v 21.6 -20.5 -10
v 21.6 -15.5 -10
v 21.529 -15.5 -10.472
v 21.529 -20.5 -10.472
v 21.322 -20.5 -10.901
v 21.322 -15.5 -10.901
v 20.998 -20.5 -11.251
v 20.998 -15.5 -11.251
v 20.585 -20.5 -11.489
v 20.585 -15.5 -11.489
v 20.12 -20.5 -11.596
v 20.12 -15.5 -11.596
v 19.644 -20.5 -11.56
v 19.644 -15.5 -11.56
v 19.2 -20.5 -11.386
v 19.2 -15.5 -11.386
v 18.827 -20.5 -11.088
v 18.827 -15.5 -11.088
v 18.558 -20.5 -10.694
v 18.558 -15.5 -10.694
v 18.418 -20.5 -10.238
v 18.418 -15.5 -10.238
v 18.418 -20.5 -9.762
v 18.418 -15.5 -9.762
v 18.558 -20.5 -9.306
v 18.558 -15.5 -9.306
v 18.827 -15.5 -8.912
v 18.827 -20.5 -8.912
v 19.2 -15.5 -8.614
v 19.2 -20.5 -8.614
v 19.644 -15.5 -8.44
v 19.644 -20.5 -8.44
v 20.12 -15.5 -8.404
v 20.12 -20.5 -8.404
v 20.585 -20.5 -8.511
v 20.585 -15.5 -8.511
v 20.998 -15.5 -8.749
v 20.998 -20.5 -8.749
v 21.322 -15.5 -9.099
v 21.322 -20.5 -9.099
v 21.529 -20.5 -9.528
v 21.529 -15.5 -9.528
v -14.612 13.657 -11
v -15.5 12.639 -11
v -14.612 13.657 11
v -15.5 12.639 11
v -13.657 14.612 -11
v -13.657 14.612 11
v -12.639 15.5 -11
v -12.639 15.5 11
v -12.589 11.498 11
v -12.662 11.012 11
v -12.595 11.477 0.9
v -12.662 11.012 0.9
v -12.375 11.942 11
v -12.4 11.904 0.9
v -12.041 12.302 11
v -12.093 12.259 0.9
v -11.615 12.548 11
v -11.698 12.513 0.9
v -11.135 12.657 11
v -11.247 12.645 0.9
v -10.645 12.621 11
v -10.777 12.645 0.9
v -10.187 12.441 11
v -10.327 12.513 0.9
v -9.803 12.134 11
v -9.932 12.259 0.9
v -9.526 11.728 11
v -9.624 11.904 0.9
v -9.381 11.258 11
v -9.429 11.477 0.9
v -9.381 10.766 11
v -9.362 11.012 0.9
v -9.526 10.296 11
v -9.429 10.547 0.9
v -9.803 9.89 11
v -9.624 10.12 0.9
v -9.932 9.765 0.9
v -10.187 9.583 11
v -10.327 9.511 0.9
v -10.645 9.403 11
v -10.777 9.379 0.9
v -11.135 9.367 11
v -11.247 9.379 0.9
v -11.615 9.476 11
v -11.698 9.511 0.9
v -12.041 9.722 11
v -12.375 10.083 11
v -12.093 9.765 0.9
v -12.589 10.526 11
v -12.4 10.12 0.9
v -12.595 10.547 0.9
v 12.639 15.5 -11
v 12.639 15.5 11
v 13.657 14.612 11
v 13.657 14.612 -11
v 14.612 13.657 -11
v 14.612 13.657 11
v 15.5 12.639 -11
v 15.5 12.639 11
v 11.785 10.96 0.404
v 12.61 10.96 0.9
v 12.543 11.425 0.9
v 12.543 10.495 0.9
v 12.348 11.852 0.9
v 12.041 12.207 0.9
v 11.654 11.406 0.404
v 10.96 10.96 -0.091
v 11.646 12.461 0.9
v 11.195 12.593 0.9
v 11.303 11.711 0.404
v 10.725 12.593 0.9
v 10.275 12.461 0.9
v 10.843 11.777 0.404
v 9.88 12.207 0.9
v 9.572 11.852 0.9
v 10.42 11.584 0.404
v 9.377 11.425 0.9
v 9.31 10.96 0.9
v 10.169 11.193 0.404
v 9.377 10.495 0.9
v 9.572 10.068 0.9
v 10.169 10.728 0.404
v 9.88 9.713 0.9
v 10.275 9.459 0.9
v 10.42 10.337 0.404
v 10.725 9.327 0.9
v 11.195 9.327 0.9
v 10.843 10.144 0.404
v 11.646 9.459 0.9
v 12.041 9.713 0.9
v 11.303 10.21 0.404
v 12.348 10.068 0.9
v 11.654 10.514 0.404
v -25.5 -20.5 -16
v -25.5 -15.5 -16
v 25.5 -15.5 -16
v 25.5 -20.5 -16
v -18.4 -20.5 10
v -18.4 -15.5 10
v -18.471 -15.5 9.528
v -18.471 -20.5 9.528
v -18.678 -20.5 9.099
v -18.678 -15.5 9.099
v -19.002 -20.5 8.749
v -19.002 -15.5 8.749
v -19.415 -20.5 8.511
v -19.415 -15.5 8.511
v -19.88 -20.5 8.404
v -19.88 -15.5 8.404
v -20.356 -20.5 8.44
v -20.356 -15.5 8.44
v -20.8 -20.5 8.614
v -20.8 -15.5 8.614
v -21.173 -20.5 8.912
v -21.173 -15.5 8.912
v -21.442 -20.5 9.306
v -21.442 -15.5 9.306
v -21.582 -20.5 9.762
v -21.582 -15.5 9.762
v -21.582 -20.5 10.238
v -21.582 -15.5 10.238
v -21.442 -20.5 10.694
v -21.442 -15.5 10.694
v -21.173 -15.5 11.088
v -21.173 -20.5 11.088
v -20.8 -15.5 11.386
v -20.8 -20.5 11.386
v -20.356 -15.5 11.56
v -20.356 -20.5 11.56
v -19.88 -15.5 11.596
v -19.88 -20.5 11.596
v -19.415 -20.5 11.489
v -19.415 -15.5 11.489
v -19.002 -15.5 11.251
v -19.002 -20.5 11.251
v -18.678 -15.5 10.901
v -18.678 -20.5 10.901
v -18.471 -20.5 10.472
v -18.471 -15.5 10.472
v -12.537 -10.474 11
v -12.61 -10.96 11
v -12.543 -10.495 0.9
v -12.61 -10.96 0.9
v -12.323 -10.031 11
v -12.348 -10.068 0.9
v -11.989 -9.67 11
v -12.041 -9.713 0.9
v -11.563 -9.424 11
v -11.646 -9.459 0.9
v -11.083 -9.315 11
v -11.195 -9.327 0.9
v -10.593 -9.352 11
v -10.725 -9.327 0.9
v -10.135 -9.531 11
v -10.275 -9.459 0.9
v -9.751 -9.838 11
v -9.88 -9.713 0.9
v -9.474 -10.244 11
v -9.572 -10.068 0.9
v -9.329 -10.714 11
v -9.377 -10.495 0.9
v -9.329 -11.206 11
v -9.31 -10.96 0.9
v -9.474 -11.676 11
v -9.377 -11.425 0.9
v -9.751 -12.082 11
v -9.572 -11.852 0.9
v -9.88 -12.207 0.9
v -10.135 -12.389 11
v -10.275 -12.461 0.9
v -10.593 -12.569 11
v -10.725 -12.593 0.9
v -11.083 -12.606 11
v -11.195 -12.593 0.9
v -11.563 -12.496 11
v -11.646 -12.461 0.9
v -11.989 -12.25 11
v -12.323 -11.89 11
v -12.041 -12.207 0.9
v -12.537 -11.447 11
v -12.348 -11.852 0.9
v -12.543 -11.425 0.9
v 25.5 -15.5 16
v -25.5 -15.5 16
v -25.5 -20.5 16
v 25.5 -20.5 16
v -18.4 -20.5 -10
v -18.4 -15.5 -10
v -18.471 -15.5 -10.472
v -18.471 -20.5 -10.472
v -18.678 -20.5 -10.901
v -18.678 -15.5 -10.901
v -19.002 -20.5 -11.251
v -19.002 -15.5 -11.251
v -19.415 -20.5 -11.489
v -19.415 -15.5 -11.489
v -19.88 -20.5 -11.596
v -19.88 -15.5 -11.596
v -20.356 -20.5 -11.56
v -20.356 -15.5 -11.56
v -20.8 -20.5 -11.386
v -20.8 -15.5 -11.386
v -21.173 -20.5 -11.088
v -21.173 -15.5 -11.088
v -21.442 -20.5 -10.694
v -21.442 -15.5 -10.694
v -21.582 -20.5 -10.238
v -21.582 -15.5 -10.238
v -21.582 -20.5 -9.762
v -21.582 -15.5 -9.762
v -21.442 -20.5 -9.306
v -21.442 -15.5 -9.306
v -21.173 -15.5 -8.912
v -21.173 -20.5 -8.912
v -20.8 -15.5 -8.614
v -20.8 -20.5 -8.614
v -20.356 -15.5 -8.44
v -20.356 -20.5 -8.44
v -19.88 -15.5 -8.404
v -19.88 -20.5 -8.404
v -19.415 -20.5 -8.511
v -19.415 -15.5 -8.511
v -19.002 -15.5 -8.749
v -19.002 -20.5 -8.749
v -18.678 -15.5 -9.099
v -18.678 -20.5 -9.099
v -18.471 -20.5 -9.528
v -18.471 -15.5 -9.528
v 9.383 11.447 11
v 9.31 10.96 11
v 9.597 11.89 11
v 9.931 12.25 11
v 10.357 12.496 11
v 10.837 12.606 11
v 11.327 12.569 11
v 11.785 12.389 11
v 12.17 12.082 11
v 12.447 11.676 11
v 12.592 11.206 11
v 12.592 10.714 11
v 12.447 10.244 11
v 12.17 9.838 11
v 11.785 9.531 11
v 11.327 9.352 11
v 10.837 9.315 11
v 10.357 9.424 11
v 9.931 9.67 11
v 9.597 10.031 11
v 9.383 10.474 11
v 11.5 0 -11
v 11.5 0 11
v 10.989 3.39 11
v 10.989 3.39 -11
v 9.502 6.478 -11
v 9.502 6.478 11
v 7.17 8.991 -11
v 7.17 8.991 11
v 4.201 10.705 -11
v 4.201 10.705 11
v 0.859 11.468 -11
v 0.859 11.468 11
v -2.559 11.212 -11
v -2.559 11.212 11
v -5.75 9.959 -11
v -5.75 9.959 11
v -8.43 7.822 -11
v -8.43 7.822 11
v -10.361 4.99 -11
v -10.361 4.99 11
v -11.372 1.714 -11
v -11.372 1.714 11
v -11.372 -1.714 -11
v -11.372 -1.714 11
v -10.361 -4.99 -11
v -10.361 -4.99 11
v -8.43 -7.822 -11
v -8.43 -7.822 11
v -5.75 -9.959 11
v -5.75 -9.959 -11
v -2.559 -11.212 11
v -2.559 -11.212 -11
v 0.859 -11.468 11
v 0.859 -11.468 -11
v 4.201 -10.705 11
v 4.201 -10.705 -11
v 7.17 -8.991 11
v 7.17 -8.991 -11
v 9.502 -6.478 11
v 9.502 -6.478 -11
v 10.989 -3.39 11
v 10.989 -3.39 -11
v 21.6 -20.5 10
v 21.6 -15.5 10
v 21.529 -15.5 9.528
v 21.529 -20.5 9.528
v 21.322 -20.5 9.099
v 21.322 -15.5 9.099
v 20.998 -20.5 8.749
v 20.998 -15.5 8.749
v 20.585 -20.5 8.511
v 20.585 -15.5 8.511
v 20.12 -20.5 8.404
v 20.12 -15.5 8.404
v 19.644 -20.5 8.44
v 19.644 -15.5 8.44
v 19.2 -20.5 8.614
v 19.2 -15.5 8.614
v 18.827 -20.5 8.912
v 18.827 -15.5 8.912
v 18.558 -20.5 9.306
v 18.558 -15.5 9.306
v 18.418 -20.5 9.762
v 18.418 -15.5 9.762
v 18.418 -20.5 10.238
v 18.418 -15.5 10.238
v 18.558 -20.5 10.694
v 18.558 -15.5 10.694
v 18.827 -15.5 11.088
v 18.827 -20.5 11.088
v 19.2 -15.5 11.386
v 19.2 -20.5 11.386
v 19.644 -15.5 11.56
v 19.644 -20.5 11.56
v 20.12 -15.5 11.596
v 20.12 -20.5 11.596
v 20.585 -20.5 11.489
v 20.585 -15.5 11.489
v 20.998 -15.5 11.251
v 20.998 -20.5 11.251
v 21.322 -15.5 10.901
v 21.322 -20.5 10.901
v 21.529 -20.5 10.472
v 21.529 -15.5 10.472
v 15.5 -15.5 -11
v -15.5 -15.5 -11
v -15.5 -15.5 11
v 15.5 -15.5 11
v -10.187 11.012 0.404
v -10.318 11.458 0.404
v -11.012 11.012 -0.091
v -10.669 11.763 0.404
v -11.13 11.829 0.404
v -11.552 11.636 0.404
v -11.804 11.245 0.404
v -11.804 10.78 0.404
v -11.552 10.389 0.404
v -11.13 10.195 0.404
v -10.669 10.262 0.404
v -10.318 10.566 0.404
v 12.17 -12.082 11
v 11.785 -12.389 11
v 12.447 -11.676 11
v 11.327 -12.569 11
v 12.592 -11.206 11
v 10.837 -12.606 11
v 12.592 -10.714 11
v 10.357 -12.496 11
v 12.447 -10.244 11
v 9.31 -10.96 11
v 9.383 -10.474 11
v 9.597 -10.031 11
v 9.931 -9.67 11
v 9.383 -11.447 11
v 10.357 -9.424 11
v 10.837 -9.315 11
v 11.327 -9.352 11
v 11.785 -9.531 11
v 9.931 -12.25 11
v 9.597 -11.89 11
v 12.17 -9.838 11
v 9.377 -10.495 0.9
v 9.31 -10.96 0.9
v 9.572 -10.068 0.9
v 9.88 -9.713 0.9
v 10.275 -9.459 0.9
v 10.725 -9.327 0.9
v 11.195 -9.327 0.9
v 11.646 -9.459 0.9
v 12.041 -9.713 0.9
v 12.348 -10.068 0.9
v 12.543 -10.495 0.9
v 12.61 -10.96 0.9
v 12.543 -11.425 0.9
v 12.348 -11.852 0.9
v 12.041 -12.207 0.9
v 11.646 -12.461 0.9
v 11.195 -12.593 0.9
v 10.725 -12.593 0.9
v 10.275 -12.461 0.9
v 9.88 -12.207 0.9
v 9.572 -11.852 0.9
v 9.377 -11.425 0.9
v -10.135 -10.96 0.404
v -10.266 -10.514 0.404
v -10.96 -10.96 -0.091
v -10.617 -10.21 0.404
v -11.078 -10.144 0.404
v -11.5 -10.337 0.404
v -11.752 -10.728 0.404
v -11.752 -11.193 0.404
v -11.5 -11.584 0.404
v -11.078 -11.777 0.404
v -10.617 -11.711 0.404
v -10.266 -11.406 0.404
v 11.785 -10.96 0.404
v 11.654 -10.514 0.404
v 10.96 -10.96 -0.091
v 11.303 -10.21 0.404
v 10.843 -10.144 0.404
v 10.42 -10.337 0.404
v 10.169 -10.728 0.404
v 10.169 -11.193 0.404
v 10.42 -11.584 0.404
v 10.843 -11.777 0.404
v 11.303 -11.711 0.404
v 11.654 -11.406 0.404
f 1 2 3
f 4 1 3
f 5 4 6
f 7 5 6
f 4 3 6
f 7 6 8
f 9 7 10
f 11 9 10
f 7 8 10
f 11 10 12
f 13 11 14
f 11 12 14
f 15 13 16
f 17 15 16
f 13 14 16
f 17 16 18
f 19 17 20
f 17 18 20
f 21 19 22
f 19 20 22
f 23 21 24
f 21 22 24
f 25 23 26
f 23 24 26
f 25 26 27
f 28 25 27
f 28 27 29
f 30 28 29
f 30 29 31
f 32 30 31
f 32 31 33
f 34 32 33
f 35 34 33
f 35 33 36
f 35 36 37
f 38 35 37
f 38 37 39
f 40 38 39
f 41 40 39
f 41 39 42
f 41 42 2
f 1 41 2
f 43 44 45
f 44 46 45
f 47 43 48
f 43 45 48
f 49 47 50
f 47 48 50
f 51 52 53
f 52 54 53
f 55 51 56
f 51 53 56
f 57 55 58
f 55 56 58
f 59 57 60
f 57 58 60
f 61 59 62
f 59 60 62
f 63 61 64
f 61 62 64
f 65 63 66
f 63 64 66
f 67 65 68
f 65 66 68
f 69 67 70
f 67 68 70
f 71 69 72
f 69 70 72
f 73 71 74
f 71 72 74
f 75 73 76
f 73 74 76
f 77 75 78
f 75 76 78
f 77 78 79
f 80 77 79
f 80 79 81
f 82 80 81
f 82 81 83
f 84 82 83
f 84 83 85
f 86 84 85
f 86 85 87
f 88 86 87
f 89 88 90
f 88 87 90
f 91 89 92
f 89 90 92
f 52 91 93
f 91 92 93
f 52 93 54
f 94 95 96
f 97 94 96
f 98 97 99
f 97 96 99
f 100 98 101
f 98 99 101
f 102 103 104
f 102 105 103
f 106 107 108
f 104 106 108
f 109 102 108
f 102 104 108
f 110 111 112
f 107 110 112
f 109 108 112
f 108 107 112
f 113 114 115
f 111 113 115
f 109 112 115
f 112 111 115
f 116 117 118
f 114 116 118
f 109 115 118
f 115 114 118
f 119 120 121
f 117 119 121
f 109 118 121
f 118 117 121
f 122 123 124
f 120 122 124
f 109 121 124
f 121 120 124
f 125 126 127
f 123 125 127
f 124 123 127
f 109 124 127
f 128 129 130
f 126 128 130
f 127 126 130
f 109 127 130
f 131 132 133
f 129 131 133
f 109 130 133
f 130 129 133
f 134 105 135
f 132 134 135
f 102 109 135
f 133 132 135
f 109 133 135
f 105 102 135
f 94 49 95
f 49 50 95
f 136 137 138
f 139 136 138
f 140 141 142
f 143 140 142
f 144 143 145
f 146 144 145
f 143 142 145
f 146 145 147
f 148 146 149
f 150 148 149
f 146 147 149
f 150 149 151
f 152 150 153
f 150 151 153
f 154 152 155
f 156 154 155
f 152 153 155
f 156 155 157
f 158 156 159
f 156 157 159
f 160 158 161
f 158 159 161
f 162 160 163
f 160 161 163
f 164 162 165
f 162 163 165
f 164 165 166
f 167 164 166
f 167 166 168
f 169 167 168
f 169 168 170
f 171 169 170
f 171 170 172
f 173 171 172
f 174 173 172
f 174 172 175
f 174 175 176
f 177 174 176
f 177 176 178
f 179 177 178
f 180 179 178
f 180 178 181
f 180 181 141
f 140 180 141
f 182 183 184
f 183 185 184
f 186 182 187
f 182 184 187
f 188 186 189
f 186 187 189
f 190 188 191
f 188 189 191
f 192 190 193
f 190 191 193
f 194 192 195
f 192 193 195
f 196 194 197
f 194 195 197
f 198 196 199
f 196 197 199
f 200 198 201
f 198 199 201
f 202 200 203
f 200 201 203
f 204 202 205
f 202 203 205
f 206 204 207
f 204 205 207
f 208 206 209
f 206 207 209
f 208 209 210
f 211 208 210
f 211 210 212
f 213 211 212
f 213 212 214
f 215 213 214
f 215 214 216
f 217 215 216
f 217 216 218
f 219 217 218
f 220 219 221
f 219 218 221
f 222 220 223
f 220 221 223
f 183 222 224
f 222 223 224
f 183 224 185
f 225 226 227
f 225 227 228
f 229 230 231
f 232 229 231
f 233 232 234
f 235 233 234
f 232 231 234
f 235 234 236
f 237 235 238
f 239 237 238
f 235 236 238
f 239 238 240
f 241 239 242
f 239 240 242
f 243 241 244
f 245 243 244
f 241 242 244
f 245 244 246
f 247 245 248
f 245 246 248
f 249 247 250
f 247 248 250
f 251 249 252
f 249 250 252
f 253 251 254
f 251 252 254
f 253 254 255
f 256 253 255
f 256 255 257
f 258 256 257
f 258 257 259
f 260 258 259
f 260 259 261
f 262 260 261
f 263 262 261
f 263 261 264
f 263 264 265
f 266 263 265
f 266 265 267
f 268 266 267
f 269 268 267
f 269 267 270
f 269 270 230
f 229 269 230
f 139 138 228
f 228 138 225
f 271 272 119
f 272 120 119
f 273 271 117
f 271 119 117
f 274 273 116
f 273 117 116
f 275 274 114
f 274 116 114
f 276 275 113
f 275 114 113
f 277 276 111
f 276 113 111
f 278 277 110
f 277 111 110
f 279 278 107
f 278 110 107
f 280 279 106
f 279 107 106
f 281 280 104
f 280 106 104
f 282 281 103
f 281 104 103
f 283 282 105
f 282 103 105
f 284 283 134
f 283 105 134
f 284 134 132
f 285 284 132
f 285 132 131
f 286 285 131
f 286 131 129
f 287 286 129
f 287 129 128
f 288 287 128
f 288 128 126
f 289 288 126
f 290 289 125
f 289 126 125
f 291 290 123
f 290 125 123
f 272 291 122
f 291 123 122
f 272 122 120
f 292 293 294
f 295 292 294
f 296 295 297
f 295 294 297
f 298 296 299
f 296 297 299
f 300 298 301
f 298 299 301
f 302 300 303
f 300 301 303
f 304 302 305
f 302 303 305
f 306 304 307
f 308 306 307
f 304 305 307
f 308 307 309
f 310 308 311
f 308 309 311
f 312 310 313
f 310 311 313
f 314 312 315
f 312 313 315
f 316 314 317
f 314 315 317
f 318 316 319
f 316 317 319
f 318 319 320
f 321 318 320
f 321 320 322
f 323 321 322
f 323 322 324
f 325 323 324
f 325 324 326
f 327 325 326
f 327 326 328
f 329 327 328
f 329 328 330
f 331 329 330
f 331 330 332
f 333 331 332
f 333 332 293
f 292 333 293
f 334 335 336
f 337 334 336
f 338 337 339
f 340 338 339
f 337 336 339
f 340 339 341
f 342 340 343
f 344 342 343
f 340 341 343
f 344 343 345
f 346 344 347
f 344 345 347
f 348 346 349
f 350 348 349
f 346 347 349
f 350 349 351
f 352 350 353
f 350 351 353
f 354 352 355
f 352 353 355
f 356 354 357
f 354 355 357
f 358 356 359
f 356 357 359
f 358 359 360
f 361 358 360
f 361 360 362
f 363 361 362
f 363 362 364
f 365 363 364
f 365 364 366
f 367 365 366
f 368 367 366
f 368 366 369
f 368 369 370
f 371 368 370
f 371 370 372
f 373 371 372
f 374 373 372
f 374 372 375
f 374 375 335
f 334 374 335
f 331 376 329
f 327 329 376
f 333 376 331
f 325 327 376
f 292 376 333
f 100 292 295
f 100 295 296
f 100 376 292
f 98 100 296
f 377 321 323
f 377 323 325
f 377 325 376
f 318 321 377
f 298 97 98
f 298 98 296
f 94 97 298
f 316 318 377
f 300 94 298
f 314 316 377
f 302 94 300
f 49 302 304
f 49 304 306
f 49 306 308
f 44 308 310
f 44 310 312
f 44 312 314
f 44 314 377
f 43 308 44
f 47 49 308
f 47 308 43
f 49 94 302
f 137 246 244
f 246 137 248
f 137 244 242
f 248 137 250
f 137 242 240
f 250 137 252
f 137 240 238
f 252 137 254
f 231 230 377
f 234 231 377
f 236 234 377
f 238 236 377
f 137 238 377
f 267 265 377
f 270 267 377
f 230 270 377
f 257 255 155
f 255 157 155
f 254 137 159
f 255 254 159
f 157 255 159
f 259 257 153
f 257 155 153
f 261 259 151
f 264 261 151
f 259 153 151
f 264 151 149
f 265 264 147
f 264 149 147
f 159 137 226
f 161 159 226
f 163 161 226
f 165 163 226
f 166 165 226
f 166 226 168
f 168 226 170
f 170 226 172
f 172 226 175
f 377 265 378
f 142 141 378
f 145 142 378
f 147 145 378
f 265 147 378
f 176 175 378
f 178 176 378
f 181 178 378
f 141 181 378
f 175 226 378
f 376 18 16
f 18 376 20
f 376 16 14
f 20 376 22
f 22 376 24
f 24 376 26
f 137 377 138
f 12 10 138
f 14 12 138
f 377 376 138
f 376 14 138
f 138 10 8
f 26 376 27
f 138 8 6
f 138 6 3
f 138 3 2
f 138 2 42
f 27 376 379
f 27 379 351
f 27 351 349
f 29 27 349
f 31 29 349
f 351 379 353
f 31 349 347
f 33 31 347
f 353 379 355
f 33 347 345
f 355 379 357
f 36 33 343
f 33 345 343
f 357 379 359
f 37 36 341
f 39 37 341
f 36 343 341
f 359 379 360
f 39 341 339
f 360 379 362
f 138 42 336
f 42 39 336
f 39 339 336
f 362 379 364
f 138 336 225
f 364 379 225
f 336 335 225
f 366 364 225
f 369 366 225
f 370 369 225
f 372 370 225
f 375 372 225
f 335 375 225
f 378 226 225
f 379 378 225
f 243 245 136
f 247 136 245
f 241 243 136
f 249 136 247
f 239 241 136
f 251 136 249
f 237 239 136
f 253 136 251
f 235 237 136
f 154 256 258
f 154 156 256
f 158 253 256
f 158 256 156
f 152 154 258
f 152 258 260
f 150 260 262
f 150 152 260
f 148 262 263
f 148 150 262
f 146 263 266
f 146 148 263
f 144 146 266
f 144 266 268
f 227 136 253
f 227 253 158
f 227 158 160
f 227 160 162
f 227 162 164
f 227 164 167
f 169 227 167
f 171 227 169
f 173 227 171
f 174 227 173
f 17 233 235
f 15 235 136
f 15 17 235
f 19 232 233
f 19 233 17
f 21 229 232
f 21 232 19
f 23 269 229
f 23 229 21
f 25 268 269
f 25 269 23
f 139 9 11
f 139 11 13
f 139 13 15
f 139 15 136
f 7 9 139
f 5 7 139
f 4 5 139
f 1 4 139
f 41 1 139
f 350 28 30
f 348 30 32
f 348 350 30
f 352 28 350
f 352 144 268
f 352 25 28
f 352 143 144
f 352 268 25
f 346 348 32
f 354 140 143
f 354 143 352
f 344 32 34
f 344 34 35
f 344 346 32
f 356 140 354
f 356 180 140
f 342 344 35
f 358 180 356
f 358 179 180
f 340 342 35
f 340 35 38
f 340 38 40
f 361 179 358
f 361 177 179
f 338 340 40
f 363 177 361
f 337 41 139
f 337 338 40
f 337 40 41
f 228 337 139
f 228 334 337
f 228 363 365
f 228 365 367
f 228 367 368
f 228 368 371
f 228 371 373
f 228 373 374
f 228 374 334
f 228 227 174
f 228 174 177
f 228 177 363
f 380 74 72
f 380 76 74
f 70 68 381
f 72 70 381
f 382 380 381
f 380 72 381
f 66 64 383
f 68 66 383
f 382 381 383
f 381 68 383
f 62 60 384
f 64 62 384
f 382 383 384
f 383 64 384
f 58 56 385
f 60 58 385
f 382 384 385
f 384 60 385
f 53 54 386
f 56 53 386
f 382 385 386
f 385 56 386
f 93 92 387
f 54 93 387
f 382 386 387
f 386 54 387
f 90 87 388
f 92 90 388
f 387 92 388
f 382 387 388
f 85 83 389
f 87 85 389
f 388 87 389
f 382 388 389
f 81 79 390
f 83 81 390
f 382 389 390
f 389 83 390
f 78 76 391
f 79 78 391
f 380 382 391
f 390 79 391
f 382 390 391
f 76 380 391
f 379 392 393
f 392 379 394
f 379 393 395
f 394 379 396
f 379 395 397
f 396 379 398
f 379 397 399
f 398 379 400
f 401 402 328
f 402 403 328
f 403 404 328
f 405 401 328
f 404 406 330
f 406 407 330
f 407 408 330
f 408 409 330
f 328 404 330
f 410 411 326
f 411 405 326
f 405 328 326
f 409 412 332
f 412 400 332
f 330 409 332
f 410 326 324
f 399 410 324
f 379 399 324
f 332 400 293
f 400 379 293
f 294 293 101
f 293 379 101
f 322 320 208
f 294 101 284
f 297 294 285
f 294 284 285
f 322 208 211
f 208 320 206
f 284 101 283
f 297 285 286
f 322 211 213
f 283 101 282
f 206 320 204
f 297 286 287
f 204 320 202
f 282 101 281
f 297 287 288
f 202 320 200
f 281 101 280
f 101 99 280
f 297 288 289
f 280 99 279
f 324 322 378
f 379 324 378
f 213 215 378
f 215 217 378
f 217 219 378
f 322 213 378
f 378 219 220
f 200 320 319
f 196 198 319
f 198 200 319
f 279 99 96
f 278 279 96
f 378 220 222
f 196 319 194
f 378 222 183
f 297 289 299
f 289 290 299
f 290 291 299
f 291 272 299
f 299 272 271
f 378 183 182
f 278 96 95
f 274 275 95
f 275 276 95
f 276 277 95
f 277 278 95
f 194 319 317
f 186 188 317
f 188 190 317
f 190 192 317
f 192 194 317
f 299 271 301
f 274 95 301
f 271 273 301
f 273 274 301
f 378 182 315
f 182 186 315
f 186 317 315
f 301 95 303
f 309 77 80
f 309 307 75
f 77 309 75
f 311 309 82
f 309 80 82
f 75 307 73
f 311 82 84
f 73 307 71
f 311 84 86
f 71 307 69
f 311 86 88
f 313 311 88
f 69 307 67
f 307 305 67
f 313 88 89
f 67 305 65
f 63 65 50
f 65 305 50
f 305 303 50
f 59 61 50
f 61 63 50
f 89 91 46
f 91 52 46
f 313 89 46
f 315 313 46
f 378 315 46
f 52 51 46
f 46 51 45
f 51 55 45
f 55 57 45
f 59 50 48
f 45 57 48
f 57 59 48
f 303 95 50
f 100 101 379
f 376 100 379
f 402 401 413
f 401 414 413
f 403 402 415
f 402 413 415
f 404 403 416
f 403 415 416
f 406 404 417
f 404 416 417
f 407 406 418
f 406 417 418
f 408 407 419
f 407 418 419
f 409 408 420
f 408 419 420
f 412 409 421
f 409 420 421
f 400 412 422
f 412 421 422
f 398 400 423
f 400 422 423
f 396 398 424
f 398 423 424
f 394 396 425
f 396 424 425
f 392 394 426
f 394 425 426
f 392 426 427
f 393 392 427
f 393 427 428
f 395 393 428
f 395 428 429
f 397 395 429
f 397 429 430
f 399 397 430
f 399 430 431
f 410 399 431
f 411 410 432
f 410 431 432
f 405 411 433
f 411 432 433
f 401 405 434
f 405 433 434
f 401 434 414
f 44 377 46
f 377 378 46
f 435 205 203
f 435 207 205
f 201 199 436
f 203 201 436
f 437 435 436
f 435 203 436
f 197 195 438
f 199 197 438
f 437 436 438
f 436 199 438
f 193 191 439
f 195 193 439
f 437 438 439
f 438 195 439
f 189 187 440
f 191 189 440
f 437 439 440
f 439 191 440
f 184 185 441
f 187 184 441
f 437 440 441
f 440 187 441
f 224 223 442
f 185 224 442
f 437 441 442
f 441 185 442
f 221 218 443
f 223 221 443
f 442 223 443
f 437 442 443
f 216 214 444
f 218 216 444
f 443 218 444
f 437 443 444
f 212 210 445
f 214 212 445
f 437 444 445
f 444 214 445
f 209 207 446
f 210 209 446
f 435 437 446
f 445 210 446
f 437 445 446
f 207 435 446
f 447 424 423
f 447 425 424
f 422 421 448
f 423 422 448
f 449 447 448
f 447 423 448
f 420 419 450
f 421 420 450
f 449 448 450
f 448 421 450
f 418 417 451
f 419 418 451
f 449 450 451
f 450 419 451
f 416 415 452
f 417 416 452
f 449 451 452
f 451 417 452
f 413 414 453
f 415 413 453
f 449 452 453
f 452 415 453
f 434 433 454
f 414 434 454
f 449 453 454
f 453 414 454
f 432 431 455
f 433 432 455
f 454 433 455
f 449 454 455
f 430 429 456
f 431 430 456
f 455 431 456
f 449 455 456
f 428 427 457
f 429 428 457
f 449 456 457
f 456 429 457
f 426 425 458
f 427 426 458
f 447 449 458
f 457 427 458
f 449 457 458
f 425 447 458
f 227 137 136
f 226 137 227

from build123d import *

# Parameters (mm, degrees)
EXTRUDE_1_DEPTH             = 11
CUT_EXTRUDE_1_REACH         = 24
SKETCH_2_R                  = 11.5
HOLE_WIZARD_M4_1_D          = 3.3
HOLE_WIZARD_M4_1_DEPTH      = 10.1
HOLE_WIZARD_M4_1_TIP        = 0.991420021
SKETCH_9_W                  = 51
SKETCH_9_H                  = 32
EXTRUDE_2_DEPTH             = 5
HOLE_WIZARD_3_2_3_2_1_D     = 3.2
HOLE_WIZARD_3_2_3_2_1_DEPTH = 5


with BuildPart() as part:
    # 草图1 → 凸台-拉伸1 (new body, symmetric)
    with BuildSketch(Plane.XY):
        with BuildLine():
            Line((15.5, -15.5), (-15.5, -15.5))
            Line((-15.5, -15.5), (-15.5, 12.63922466))
            ThreePointArc((-15.5, 12.63922466), (-14.142135624, 14.142135624), (-12.63922466, 15.5))
            Line((-12.63922466, 15.5), (12.63922466, 15.5))
            ThreePointArc((12.63922466, 15.5), (14.142135624, 14.142135624), (15.5, 12.63922466))
            Line((15.5, 12.63922466), (15.5, -15.5))
        make_face()
    extrude(amount=EXTRUDE_1_DEPTH, both=True)

    # 草图2 → 切除-拉伸1 (cut, up to next)
    with BuildSketch(Plane.XY.offset(11), mode=Mode.PRIVATE) as cut_extrude_1_sk1:
        Circle(SKETCH_2_R)
    cut_extrude_1_tool1 = extrude(cut_extrude_1_sk1.sketch, amount=-CUT_EXTRUDE_1_REACH, mode=Mode.PRIVATE) & part.part
    add(cut_extrude_1_tool1.solids().sort_by_distance((0, 0, 11))[0], mode=Mode.SUBTRACT)

    # M4 螺纹孔1
    with Locations(Plane.XY.offset(11)):
        with Locations((-11.012100522, 11.012100522), (10.960155108, 10.960155108), (10.960155108, -10.960155108), (-10.960155108, -10.960155108)):
            Hole(HOLE_WIZARD_M4_1_D / 2, depth=HOLE_WIZARD_M4_1_DEPTH)
            with Locations((0, 0, -(HOLE_WIZARD_M4_1_DEPTH + HOLE_WIZARD_M4_1_TIP / 2))):  # 118° drill point
                Cone(0, HOLE_WIZARD_M4_1_D / 2, HOLE_WIZARD_M4_1_TIP, mode=Mode.SUBTRACT)

    # 草图9 → 凸台-拉伸2 (add)
    with BuildSketch(Plane.XZ.offset(15.5)):
        Rectangle(SKETCH_9_W, SKETCH_9_H)
    extrude(amount=EXTRUDE_2_DEPTH)

    # Ø3.2 (3.2) 直径孔1
    with Locations(Plane(origin=(0, -20.5, 0), x_dir=(-1, 0, 0), z_dir=(0, -1, 0))):
        with Locations((20, -10), (-20, -10), (-20, 10), (20, 10)):
            Hole(HOLE_WIZARD_3_2_3_2_1_D / 2, depth=HOLE_WIZARD_3_2_3_2_1_DEPTH)


solid = part.part
